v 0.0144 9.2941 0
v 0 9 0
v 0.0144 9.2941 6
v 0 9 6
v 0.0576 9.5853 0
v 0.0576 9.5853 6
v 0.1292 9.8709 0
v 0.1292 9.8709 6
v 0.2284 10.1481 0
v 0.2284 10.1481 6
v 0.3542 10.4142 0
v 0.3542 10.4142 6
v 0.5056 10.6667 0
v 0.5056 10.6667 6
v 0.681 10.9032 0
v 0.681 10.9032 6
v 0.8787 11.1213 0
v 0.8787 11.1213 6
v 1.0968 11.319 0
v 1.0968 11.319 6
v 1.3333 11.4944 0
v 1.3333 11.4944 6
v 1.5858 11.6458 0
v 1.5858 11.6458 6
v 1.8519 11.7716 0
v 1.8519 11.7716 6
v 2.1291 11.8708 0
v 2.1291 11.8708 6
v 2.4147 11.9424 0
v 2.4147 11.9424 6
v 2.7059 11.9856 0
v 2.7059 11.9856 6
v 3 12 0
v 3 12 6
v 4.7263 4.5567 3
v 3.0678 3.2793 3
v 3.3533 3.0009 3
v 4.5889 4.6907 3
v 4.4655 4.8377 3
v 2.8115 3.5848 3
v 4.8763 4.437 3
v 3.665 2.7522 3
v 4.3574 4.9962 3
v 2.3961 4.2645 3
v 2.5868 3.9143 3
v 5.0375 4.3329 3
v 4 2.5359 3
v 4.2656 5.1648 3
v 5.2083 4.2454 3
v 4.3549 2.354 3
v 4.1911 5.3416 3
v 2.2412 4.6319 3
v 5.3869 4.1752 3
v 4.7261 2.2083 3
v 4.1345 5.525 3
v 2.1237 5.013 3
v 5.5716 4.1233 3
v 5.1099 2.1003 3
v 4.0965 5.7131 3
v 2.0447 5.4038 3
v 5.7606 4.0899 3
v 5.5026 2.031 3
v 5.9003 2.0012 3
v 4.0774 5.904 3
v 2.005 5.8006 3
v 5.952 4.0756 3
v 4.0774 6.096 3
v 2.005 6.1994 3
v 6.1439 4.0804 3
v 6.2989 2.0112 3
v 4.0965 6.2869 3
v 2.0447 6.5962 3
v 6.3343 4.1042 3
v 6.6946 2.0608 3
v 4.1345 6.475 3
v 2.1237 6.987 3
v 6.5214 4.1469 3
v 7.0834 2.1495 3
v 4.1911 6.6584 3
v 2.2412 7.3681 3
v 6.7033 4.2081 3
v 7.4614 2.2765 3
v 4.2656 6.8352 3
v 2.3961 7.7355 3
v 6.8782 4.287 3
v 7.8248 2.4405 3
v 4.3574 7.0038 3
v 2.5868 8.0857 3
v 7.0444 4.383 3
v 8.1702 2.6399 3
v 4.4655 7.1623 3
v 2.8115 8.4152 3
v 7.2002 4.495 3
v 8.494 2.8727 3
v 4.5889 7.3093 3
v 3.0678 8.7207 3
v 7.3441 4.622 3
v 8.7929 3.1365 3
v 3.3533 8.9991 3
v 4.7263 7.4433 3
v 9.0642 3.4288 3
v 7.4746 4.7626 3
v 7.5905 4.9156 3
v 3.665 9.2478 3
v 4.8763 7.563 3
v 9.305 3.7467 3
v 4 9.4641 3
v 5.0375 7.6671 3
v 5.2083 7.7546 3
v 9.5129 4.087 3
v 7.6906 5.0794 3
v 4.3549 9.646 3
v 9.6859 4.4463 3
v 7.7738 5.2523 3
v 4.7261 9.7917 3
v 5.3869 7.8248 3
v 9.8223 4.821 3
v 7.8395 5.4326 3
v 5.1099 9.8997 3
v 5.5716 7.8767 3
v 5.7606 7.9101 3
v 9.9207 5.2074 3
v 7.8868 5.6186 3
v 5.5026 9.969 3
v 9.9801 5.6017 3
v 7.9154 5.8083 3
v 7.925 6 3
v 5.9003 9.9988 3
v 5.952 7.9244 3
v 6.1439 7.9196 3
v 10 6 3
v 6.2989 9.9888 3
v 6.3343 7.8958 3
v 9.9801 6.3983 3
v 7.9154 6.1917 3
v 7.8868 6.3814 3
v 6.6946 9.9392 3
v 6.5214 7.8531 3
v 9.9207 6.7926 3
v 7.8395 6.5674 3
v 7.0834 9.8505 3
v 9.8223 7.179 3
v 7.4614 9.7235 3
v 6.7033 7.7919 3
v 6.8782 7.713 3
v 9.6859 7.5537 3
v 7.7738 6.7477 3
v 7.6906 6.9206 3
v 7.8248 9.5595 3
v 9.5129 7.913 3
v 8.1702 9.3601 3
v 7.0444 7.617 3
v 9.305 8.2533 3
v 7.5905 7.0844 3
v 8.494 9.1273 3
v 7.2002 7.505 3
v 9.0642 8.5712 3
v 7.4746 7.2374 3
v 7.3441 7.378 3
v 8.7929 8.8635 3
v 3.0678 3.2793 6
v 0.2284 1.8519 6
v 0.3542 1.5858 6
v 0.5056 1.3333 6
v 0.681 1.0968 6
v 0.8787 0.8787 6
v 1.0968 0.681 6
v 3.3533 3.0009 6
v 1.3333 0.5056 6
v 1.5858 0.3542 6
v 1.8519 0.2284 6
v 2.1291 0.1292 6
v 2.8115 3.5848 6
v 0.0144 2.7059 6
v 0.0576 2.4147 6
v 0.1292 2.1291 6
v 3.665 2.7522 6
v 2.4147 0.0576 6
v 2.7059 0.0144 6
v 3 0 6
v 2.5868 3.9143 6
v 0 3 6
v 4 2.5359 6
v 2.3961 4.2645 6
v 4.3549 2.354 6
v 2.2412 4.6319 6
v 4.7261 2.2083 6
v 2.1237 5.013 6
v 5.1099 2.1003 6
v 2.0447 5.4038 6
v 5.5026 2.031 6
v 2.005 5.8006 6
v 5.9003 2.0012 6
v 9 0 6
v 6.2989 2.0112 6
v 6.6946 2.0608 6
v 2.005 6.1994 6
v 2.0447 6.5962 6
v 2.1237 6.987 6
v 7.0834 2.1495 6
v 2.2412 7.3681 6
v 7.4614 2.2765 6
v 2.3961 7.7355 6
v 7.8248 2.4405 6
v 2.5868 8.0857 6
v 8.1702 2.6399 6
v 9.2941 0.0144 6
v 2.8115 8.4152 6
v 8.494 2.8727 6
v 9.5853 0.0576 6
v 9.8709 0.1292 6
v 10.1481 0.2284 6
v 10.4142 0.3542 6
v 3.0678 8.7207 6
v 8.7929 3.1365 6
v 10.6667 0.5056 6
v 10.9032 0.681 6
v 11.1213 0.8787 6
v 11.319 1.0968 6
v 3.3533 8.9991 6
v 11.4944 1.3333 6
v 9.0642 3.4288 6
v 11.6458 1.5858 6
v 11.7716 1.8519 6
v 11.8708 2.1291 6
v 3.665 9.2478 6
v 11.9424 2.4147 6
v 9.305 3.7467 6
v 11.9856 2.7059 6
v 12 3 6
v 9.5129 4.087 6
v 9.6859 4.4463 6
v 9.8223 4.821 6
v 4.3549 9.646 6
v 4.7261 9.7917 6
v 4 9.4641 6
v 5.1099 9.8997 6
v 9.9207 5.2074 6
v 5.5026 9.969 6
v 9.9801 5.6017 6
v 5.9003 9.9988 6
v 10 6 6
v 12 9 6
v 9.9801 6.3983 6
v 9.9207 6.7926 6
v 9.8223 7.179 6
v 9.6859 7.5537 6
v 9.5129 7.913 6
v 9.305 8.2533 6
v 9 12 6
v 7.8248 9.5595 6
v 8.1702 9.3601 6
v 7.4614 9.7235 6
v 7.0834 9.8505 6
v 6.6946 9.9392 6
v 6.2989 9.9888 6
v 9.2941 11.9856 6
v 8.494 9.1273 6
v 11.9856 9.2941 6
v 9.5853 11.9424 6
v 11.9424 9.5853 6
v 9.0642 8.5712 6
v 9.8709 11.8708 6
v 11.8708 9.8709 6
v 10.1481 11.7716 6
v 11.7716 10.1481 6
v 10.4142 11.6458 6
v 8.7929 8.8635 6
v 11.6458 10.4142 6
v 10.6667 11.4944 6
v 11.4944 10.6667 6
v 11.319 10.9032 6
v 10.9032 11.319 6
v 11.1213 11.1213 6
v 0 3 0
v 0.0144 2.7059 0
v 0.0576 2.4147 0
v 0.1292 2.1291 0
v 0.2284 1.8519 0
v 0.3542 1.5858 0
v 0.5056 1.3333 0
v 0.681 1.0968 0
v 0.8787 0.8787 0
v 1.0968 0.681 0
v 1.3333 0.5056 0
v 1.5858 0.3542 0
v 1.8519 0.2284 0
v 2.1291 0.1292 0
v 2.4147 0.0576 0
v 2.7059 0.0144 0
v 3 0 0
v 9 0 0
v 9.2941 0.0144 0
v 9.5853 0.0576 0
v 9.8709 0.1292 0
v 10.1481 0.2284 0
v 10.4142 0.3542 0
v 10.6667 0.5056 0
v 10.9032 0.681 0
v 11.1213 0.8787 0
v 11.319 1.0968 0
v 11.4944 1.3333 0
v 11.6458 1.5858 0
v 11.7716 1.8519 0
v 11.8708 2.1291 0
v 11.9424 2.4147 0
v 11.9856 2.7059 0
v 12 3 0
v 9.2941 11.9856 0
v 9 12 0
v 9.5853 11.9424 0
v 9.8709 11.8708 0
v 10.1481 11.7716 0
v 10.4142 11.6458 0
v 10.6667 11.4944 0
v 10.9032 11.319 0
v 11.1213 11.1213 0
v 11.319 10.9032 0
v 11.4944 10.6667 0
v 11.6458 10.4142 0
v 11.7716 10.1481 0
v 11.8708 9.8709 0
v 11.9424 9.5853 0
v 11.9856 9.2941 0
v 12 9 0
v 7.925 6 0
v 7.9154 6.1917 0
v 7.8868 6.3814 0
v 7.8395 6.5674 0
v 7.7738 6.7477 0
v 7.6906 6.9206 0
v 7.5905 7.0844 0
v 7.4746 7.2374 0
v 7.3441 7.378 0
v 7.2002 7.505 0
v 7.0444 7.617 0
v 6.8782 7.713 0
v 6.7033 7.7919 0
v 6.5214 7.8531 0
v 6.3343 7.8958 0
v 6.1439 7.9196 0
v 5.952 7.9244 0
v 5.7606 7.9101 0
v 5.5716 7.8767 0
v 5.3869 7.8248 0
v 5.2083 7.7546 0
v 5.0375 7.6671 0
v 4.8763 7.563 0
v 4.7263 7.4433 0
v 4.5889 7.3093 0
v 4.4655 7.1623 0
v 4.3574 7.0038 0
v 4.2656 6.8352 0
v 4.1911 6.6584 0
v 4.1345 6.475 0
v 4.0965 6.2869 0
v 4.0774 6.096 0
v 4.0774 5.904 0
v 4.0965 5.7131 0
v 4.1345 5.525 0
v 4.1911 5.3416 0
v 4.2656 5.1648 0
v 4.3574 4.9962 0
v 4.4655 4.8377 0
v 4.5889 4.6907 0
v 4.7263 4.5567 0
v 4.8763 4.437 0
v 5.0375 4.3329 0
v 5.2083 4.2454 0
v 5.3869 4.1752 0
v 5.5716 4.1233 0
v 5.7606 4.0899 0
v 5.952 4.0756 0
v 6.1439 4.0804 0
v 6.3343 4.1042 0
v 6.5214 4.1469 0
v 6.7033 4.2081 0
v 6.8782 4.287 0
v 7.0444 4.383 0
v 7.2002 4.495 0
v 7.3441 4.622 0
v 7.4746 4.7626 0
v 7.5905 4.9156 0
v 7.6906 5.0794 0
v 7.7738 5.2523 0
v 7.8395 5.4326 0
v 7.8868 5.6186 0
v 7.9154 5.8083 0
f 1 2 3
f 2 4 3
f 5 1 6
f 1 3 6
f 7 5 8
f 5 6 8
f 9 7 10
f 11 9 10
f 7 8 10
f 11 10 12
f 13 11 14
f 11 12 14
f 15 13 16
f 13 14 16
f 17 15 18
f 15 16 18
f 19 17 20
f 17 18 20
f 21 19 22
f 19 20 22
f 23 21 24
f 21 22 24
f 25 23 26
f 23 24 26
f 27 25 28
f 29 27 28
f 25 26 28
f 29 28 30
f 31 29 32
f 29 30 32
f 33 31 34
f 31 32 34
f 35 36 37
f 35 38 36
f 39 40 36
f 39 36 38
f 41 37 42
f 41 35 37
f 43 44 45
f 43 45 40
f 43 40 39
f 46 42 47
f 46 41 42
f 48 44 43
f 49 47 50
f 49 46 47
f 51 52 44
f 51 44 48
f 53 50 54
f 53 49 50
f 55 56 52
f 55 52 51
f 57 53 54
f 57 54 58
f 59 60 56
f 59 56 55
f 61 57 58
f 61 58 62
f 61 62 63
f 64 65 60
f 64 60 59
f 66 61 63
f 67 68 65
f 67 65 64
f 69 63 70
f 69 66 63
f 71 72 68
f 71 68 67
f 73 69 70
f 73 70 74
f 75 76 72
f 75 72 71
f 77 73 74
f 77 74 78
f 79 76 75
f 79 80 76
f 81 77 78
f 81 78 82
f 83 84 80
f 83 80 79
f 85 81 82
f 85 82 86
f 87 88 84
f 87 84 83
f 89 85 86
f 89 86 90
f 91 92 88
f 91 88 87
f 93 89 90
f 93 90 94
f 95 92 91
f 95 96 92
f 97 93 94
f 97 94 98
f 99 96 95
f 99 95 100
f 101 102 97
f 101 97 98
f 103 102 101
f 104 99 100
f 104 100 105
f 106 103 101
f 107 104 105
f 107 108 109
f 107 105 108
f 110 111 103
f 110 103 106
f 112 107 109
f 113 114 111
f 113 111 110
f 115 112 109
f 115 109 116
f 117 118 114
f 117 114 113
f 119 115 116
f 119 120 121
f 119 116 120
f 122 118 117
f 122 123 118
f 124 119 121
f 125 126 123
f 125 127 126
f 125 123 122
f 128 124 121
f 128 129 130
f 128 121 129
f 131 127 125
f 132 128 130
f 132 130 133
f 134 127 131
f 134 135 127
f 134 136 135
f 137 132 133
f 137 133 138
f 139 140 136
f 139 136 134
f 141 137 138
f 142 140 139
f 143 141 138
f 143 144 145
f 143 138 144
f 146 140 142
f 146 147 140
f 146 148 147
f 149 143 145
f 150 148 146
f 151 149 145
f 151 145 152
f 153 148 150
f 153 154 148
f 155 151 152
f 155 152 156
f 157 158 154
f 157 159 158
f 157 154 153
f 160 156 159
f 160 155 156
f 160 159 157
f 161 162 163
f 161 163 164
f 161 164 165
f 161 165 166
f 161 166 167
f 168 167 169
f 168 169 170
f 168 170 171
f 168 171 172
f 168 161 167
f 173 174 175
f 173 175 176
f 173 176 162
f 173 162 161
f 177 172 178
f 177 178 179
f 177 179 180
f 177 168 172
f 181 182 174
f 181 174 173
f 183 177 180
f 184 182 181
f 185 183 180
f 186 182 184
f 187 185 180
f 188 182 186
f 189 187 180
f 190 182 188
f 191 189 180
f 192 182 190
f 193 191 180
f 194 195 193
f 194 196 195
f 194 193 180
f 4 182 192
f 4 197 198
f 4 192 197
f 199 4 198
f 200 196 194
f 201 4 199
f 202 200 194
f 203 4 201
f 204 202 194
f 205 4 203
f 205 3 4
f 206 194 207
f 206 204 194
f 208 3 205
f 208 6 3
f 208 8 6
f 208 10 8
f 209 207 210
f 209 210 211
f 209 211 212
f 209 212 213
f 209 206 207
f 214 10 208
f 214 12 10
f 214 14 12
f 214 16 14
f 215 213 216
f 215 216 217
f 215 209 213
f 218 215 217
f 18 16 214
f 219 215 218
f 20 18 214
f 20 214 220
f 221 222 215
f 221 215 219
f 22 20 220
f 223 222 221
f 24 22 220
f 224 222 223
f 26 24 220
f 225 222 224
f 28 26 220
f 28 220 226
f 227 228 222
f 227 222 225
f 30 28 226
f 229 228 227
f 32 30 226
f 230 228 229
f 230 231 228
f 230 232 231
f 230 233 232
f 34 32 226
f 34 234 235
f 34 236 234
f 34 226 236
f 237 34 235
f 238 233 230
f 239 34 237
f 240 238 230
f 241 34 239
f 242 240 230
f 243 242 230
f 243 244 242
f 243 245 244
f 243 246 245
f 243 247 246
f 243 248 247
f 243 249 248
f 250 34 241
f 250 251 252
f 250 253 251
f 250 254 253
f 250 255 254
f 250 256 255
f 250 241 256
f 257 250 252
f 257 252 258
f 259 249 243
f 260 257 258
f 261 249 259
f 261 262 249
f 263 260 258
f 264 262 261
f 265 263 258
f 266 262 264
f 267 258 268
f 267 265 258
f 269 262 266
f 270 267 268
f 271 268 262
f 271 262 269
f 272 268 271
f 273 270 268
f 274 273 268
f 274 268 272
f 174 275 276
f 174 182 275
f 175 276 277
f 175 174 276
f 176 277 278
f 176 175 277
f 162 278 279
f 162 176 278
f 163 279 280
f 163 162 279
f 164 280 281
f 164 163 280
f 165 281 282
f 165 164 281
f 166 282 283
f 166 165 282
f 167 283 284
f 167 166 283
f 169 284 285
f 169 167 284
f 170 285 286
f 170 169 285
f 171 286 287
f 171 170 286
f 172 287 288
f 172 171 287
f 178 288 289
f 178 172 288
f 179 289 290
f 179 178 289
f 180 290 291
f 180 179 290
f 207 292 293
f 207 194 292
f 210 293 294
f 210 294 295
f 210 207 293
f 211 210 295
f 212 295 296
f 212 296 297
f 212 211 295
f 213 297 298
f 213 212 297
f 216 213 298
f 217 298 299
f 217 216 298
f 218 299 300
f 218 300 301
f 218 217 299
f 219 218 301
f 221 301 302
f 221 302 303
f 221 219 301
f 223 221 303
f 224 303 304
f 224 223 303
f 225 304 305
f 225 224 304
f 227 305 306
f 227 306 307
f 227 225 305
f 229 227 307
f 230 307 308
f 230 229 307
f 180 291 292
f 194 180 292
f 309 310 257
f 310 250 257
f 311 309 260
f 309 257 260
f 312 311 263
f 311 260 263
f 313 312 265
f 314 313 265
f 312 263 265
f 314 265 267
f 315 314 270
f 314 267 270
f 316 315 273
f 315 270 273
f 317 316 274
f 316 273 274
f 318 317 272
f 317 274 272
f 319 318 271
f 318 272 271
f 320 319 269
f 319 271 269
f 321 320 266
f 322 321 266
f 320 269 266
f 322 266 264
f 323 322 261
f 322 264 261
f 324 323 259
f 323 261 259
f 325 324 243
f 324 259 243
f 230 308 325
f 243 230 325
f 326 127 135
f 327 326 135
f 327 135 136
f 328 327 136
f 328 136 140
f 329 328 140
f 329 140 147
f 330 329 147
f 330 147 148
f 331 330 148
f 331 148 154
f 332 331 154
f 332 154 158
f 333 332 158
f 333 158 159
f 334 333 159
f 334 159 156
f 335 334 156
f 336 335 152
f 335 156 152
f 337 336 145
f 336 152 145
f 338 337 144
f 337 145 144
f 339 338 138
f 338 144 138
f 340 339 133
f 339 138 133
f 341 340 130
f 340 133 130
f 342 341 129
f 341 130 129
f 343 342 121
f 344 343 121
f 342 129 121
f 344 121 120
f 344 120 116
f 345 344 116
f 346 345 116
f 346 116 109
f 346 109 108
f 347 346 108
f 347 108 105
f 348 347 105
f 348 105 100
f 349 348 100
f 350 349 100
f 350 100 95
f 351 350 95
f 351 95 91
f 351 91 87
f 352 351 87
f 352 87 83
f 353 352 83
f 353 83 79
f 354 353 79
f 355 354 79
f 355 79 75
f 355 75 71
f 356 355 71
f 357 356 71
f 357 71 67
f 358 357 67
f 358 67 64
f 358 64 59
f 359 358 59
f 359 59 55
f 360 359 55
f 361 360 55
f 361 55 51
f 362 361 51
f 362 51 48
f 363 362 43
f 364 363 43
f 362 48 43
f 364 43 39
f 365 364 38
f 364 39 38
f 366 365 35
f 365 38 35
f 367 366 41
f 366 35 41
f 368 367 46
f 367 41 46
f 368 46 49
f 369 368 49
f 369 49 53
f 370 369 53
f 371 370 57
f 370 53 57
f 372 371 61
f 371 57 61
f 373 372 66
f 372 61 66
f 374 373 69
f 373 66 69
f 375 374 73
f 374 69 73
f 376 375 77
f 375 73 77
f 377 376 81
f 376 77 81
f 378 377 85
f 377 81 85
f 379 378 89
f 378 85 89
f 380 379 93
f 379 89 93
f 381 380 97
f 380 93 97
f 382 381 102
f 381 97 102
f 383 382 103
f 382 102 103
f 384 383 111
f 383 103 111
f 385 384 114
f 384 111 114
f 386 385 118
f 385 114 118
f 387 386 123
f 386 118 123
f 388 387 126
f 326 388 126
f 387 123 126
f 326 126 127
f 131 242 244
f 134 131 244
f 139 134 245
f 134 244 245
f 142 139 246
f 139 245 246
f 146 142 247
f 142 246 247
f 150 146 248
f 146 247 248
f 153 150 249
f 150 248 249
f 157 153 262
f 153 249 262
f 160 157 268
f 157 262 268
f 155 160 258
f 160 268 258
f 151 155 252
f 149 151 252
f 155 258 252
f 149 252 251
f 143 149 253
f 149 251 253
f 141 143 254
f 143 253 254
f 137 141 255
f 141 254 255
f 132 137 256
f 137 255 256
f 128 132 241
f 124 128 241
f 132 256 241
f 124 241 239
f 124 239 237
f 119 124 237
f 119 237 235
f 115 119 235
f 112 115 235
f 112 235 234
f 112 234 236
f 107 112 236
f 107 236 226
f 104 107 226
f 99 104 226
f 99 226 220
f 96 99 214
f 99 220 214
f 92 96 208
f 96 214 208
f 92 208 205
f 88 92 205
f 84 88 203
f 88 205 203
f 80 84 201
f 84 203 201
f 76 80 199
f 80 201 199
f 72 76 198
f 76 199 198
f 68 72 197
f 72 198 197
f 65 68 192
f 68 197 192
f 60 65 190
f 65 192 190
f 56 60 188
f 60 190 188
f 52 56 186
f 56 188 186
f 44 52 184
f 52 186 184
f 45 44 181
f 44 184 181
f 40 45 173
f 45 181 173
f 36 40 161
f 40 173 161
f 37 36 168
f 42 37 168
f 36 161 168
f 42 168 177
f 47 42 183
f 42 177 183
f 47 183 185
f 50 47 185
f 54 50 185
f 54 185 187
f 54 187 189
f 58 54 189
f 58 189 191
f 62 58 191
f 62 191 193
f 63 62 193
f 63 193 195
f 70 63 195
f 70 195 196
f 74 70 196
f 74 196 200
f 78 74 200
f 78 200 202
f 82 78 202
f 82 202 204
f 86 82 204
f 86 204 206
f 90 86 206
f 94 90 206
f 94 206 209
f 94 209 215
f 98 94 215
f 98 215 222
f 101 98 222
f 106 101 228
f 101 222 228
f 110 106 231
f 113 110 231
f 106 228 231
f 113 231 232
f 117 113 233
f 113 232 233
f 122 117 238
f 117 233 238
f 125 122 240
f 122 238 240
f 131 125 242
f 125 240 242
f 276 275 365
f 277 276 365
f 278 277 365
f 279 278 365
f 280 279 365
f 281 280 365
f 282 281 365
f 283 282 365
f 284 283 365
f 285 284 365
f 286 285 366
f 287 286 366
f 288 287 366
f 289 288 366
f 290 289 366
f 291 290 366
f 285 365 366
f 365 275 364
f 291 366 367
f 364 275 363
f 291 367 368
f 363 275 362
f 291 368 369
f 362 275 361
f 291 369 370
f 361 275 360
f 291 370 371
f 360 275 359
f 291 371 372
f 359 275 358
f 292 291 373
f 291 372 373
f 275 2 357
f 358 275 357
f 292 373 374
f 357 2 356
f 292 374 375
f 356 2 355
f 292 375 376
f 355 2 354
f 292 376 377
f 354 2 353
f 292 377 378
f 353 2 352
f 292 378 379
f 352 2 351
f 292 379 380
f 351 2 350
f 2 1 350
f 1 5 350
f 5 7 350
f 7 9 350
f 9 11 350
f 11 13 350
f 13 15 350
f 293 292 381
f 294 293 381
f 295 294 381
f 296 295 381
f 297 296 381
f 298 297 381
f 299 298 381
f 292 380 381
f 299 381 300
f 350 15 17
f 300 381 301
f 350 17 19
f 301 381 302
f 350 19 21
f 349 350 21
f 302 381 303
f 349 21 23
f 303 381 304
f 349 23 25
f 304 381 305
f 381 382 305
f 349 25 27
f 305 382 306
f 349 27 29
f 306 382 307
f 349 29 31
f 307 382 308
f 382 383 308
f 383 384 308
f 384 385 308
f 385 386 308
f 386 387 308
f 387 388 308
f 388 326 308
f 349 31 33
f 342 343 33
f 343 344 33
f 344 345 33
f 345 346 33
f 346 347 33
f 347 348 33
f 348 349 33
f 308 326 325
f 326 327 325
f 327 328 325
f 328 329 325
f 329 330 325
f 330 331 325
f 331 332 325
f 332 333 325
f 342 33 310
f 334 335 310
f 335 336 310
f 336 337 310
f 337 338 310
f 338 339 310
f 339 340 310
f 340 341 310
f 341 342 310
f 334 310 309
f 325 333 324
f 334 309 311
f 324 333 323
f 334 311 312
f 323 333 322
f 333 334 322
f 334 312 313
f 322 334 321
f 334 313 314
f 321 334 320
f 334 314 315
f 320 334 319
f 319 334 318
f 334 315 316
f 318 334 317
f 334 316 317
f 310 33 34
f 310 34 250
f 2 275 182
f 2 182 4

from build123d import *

# Parameters (mm, degrees)
SKETCH_W     = 12
SKETCH_H     = 12
PAD_DEPTH    = 6
SKETCH001_R  = 1.925
HOLE_DEPTH   = 6.001
SKETCH002_R  = 4
POCKET_DEPTH = 3
FILLET_R     = 3


with BuildPart() as part:
    # Sketch → Pad (new body)
    with BuildSketch(Plane.XY):
        with Locations((6, 6)):
            Rectangle(SKETCH_W, SKETCH_H)
    extrude(amount=PAD_DEPTH)

    # Sketch001 (on Face6 of Pad) → Hole (cut, through all)
    with BuildSketch(Plane.XY.offset(6)):
        with Locations((6, 6)):
            Circle(SKETCH001_R)
    extrude(amount=-HOLE_DEPTH, mode=Mode.SUBTRACT)

    # Sketch002 (on Face5 of Hole) → Pocket (cut)
    with BuildSketch(Plane.XY.offset(6)):
        with Locations((6, 6)):
            Circle(SKETCH002_R)
    extrude(amount=-POCKET_DEPTH, mode=Mode.SUBTRACT)

    # Fillet
    fillet_edges = [part.edges().sort_by_distance(p)[0] for p in [
        (0, 0, 3),
        (12, 0, 3),
        (12, 12, 3),
        (0, 12, 3),
    ]]
    fillet(fillet_edges, radius=FILLET_R)


solid = part.part
